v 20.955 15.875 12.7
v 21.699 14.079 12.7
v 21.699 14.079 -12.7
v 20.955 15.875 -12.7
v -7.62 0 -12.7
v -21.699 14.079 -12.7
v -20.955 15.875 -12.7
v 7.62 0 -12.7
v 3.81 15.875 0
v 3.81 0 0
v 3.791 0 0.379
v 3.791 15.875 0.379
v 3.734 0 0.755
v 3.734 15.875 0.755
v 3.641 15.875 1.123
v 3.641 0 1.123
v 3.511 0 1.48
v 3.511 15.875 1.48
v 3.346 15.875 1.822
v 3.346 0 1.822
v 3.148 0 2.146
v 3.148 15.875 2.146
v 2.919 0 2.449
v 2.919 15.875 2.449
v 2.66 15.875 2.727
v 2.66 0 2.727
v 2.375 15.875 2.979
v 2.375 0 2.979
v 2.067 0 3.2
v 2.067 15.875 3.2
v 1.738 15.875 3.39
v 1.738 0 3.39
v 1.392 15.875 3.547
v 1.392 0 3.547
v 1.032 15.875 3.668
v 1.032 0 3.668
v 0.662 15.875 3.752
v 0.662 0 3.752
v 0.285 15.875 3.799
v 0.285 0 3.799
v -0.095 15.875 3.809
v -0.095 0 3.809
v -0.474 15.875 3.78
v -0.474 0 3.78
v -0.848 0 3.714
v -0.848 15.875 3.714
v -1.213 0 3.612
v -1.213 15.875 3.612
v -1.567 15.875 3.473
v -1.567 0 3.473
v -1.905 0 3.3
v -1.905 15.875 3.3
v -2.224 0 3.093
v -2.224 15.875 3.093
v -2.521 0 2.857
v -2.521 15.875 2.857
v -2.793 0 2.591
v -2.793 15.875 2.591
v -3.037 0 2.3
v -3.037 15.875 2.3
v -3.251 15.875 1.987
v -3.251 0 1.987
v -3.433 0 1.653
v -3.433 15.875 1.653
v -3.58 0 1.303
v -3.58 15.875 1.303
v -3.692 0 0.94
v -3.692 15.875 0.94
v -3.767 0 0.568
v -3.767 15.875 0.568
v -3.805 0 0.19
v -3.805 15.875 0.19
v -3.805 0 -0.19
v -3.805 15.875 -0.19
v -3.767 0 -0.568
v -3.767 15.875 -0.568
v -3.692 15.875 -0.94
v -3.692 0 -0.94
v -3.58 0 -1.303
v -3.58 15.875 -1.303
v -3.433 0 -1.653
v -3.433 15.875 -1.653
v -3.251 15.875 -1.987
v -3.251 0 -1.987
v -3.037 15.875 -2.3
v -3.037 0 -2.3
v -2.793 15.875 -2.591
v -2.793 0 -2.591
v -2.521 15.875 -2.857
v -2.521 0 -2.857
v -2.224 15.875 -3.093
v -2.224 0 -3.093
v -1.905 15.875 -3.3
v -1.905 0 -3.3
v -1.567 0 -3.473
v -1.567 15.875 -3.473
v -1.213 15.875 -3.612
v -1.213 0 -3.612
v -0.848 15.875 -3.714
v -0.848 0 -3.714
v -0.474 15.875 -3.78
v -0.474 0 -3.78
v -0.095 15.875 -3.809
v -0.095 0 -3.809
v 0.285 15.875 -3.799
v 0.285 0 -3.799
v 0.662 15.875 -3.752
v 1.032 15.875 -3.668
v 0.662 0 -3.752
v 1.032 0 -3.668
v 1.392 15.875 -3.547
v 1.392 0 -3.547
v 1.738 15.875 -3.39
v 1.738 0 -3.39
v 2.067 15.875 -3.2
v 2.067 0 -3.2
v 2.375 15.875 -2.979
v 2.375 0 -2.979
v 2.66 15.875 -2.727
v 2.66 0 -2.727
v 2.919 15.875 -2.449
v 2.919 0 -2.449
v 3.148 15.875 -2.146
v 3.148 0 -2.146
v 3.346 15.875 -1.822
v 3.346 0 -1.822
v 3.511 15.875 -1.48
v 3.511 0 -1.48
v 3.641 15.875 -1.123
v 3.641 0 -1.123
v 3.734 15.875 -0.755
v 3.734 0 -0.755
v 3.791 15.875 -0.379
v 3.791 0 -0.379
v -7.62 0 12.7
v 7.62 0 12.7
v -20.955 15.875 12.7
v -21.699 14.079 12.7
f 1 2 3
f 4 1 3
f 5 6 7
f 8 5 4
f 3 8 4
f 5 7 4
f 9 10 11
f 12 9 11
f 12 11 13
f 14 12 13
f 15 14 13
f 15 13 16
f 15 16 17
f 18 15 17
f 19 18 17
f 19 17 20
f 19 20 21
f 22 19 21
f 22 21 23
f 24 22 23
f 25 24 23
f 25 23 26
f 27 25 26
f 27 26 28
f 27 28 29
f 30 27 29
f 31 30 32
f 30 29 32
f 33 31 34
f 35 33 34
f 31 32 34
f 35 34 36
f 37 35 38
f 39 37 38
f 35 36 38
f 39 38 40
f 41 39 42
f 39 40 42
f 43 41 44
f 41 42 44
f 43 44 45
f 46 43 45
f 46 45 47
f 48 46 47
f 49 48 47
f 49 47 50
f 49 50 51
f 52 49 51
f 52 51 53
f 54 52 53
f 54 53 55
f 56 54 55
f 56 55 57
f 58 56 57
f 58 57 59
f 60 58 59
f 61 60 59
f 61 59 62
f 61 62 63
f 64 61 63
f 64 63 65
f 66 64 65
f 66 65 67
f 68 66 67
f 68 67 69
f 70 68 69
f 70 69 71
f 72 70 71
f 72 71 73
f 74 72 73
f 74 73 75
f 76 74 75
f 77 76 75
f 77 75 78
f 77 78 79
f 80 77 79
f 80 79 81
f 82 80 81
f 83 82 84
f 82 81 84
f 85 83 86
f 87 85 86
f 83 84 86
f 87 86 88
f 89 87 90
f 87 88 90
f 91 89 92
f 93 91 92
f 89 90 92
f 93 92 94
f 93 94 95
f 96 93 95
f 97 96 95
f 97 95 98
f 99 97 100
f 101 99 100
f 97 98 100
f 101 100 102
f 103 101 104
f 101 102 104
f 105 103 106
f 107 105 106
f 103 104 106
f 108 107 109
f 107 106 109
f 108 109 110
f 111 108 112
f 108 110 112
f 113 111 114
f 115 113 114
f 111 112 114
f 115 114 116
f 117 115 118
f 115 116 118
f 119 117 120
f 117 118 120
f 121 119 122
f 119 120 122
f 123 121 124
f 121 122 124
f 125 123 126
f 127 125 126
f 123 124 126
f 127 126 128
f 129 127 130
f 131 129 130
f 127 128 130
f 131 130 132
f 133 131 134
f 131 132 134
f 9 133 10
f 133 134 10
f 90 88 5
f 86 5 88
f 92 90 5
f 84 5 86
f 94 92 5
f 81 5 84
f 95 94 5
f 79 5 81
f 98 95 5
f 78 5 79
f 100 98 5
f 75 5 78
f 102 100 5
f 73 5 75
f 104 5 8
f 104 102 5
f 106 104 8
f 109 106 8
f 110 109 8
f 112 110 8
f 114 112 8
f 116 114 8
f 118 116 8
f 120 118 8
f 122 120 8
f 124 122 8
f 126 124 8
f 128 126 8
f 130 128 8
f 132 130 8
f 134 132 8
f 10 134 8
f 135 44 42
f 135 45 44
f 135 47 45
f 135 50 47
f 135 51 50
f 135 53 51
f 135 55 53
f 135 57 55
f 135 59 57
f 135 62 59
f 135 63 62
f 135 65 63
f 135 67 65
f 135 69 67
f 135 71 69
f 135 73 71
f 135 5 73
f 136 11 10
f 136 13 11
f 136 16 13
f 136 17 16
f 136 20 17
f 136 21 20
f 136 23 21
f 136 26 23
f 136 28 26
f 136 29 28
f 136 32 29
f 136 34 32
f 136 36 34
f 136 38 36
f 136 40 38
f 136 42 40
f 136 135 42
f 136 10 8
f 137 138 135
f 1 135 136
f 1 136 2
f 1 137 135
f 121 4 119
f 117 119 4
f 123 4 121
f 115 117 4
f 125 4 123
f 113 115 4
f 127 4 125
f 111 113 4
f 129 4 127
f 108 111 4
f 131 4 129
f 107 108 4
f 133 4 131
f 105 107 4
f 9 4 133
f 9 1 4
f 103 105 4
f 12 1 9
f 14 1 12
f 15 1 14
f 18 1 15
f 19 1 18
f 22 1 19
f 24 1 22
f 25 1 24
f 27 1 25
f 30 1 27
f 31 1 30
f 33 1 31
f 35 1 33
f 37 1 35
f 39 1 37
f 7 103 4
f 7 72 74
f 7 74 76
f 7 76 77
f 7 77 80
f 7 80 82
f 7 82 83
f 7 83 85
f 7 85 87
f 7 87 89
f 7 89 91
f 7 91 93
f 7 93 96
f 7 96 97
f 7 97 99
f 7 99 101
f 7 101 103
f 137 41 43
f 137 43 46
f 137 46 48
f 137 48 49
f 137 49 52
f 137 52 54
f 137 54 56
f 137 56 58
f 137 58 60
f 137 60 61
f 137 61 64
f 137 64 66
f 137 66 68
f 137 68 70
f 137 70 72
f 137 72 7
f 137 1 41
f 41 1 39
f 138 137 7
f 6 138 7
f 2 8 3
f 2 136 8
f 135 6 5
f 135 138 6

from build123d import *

# Parameters (mm, degrees)
F1_DEPTH = 12.7
F2_R     = 3.81
F3_DEPTH = 15.876
F4_SIZE  = 2.54


with BuildPart() as f1:
    # F0 (on Top) → F1 (new body, symmetric)
    with BuildSketch(Plane.XY):
        Polygon((-23.495, 15.875), (-7.62, 0), (7.62, 0), (23.495, 15.875), align=None)
    extrude(amount=F1_DEPTH, both=True)

    # F2 (on Front) → F3 (cut, through all)
    with BuildSketch(Plane.XZ):
        Circle(F2_R)
    extrude(amount=-F3_DEPTH, mode=Mode.SUBTRACT)

    # F4
    f4_edges = [f1.edges().sort_by_distance(p)[0] for p in [
        (-23.495, 15.875, 0),
        (23.495, 15.875, 0),
    ]]
    chamfer(f4_edges, length=F4_SIZE)


solid = f1.part
